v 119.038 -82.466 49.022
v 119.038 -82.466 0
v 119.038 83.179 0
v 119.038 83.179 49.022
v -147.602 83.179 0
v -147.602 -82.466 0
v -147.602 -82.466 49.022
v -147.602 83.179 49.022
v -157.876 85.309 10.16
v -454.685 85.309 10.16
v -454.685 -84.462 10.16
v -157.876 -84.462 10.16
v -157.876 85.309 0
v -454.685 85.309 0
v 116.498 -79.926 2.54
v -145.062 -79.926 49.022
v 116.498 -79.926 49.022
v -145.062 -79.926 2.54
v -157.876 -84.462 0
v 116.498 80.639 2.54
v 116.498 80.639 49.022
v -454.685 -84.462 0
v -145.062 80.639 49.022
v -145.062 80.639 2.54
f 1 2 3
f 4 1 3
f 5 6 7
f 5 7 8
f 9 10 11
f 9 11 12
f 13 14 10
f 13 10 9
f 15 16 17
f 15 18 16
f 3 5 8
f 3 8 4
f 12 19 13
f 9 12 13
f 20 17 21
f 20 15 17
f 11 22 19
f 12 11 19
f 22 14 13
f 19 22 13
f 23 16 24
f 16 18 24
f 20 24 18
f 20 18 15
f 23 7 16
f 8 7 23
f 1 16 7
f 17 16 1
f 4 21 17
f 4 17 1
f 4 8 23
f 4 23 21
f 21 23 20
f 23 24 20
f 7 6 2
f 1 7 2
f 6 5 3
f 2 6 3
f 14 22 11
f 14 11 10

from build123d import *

# Parameters (mm, degrees)
F0_W     = 266.640037
F0_H     = 165.645823
F1_DEPTH = 49.022
F2_W     = 296.809137
F2_H     = 169.770792
F3_DEPTH = 10.16
F4_T     = -2.54


with BuildPart() as f1:
    # F0 (on Top) → F1 (new body)
    with BuildSketch(Plane.XY):
        with Locations((-14.28236, 0.356428)):
            Rectangle(F0_W, F0_H)
    extrude(amount=F1_DEPTH)

    # F4
    f4_openings = [f1.faces().sort_by_distance(p)[0] for p in [
        (-14.282361, 0.356428, 49.022),
    ]]
    offset(amount=F4_T, openings=f4_openings)


with BuildPart() as f3:
    # F2 (on Top) → F3 (new body)
    with BuildSketch(Plane.XY):
        with Locations((-306.280404, 0.423476)):
            Rectangle(F2_W, F2_H)
    extrude(amount=F3_DEPTH)


solid = Compound([f1.part, f3.part])
